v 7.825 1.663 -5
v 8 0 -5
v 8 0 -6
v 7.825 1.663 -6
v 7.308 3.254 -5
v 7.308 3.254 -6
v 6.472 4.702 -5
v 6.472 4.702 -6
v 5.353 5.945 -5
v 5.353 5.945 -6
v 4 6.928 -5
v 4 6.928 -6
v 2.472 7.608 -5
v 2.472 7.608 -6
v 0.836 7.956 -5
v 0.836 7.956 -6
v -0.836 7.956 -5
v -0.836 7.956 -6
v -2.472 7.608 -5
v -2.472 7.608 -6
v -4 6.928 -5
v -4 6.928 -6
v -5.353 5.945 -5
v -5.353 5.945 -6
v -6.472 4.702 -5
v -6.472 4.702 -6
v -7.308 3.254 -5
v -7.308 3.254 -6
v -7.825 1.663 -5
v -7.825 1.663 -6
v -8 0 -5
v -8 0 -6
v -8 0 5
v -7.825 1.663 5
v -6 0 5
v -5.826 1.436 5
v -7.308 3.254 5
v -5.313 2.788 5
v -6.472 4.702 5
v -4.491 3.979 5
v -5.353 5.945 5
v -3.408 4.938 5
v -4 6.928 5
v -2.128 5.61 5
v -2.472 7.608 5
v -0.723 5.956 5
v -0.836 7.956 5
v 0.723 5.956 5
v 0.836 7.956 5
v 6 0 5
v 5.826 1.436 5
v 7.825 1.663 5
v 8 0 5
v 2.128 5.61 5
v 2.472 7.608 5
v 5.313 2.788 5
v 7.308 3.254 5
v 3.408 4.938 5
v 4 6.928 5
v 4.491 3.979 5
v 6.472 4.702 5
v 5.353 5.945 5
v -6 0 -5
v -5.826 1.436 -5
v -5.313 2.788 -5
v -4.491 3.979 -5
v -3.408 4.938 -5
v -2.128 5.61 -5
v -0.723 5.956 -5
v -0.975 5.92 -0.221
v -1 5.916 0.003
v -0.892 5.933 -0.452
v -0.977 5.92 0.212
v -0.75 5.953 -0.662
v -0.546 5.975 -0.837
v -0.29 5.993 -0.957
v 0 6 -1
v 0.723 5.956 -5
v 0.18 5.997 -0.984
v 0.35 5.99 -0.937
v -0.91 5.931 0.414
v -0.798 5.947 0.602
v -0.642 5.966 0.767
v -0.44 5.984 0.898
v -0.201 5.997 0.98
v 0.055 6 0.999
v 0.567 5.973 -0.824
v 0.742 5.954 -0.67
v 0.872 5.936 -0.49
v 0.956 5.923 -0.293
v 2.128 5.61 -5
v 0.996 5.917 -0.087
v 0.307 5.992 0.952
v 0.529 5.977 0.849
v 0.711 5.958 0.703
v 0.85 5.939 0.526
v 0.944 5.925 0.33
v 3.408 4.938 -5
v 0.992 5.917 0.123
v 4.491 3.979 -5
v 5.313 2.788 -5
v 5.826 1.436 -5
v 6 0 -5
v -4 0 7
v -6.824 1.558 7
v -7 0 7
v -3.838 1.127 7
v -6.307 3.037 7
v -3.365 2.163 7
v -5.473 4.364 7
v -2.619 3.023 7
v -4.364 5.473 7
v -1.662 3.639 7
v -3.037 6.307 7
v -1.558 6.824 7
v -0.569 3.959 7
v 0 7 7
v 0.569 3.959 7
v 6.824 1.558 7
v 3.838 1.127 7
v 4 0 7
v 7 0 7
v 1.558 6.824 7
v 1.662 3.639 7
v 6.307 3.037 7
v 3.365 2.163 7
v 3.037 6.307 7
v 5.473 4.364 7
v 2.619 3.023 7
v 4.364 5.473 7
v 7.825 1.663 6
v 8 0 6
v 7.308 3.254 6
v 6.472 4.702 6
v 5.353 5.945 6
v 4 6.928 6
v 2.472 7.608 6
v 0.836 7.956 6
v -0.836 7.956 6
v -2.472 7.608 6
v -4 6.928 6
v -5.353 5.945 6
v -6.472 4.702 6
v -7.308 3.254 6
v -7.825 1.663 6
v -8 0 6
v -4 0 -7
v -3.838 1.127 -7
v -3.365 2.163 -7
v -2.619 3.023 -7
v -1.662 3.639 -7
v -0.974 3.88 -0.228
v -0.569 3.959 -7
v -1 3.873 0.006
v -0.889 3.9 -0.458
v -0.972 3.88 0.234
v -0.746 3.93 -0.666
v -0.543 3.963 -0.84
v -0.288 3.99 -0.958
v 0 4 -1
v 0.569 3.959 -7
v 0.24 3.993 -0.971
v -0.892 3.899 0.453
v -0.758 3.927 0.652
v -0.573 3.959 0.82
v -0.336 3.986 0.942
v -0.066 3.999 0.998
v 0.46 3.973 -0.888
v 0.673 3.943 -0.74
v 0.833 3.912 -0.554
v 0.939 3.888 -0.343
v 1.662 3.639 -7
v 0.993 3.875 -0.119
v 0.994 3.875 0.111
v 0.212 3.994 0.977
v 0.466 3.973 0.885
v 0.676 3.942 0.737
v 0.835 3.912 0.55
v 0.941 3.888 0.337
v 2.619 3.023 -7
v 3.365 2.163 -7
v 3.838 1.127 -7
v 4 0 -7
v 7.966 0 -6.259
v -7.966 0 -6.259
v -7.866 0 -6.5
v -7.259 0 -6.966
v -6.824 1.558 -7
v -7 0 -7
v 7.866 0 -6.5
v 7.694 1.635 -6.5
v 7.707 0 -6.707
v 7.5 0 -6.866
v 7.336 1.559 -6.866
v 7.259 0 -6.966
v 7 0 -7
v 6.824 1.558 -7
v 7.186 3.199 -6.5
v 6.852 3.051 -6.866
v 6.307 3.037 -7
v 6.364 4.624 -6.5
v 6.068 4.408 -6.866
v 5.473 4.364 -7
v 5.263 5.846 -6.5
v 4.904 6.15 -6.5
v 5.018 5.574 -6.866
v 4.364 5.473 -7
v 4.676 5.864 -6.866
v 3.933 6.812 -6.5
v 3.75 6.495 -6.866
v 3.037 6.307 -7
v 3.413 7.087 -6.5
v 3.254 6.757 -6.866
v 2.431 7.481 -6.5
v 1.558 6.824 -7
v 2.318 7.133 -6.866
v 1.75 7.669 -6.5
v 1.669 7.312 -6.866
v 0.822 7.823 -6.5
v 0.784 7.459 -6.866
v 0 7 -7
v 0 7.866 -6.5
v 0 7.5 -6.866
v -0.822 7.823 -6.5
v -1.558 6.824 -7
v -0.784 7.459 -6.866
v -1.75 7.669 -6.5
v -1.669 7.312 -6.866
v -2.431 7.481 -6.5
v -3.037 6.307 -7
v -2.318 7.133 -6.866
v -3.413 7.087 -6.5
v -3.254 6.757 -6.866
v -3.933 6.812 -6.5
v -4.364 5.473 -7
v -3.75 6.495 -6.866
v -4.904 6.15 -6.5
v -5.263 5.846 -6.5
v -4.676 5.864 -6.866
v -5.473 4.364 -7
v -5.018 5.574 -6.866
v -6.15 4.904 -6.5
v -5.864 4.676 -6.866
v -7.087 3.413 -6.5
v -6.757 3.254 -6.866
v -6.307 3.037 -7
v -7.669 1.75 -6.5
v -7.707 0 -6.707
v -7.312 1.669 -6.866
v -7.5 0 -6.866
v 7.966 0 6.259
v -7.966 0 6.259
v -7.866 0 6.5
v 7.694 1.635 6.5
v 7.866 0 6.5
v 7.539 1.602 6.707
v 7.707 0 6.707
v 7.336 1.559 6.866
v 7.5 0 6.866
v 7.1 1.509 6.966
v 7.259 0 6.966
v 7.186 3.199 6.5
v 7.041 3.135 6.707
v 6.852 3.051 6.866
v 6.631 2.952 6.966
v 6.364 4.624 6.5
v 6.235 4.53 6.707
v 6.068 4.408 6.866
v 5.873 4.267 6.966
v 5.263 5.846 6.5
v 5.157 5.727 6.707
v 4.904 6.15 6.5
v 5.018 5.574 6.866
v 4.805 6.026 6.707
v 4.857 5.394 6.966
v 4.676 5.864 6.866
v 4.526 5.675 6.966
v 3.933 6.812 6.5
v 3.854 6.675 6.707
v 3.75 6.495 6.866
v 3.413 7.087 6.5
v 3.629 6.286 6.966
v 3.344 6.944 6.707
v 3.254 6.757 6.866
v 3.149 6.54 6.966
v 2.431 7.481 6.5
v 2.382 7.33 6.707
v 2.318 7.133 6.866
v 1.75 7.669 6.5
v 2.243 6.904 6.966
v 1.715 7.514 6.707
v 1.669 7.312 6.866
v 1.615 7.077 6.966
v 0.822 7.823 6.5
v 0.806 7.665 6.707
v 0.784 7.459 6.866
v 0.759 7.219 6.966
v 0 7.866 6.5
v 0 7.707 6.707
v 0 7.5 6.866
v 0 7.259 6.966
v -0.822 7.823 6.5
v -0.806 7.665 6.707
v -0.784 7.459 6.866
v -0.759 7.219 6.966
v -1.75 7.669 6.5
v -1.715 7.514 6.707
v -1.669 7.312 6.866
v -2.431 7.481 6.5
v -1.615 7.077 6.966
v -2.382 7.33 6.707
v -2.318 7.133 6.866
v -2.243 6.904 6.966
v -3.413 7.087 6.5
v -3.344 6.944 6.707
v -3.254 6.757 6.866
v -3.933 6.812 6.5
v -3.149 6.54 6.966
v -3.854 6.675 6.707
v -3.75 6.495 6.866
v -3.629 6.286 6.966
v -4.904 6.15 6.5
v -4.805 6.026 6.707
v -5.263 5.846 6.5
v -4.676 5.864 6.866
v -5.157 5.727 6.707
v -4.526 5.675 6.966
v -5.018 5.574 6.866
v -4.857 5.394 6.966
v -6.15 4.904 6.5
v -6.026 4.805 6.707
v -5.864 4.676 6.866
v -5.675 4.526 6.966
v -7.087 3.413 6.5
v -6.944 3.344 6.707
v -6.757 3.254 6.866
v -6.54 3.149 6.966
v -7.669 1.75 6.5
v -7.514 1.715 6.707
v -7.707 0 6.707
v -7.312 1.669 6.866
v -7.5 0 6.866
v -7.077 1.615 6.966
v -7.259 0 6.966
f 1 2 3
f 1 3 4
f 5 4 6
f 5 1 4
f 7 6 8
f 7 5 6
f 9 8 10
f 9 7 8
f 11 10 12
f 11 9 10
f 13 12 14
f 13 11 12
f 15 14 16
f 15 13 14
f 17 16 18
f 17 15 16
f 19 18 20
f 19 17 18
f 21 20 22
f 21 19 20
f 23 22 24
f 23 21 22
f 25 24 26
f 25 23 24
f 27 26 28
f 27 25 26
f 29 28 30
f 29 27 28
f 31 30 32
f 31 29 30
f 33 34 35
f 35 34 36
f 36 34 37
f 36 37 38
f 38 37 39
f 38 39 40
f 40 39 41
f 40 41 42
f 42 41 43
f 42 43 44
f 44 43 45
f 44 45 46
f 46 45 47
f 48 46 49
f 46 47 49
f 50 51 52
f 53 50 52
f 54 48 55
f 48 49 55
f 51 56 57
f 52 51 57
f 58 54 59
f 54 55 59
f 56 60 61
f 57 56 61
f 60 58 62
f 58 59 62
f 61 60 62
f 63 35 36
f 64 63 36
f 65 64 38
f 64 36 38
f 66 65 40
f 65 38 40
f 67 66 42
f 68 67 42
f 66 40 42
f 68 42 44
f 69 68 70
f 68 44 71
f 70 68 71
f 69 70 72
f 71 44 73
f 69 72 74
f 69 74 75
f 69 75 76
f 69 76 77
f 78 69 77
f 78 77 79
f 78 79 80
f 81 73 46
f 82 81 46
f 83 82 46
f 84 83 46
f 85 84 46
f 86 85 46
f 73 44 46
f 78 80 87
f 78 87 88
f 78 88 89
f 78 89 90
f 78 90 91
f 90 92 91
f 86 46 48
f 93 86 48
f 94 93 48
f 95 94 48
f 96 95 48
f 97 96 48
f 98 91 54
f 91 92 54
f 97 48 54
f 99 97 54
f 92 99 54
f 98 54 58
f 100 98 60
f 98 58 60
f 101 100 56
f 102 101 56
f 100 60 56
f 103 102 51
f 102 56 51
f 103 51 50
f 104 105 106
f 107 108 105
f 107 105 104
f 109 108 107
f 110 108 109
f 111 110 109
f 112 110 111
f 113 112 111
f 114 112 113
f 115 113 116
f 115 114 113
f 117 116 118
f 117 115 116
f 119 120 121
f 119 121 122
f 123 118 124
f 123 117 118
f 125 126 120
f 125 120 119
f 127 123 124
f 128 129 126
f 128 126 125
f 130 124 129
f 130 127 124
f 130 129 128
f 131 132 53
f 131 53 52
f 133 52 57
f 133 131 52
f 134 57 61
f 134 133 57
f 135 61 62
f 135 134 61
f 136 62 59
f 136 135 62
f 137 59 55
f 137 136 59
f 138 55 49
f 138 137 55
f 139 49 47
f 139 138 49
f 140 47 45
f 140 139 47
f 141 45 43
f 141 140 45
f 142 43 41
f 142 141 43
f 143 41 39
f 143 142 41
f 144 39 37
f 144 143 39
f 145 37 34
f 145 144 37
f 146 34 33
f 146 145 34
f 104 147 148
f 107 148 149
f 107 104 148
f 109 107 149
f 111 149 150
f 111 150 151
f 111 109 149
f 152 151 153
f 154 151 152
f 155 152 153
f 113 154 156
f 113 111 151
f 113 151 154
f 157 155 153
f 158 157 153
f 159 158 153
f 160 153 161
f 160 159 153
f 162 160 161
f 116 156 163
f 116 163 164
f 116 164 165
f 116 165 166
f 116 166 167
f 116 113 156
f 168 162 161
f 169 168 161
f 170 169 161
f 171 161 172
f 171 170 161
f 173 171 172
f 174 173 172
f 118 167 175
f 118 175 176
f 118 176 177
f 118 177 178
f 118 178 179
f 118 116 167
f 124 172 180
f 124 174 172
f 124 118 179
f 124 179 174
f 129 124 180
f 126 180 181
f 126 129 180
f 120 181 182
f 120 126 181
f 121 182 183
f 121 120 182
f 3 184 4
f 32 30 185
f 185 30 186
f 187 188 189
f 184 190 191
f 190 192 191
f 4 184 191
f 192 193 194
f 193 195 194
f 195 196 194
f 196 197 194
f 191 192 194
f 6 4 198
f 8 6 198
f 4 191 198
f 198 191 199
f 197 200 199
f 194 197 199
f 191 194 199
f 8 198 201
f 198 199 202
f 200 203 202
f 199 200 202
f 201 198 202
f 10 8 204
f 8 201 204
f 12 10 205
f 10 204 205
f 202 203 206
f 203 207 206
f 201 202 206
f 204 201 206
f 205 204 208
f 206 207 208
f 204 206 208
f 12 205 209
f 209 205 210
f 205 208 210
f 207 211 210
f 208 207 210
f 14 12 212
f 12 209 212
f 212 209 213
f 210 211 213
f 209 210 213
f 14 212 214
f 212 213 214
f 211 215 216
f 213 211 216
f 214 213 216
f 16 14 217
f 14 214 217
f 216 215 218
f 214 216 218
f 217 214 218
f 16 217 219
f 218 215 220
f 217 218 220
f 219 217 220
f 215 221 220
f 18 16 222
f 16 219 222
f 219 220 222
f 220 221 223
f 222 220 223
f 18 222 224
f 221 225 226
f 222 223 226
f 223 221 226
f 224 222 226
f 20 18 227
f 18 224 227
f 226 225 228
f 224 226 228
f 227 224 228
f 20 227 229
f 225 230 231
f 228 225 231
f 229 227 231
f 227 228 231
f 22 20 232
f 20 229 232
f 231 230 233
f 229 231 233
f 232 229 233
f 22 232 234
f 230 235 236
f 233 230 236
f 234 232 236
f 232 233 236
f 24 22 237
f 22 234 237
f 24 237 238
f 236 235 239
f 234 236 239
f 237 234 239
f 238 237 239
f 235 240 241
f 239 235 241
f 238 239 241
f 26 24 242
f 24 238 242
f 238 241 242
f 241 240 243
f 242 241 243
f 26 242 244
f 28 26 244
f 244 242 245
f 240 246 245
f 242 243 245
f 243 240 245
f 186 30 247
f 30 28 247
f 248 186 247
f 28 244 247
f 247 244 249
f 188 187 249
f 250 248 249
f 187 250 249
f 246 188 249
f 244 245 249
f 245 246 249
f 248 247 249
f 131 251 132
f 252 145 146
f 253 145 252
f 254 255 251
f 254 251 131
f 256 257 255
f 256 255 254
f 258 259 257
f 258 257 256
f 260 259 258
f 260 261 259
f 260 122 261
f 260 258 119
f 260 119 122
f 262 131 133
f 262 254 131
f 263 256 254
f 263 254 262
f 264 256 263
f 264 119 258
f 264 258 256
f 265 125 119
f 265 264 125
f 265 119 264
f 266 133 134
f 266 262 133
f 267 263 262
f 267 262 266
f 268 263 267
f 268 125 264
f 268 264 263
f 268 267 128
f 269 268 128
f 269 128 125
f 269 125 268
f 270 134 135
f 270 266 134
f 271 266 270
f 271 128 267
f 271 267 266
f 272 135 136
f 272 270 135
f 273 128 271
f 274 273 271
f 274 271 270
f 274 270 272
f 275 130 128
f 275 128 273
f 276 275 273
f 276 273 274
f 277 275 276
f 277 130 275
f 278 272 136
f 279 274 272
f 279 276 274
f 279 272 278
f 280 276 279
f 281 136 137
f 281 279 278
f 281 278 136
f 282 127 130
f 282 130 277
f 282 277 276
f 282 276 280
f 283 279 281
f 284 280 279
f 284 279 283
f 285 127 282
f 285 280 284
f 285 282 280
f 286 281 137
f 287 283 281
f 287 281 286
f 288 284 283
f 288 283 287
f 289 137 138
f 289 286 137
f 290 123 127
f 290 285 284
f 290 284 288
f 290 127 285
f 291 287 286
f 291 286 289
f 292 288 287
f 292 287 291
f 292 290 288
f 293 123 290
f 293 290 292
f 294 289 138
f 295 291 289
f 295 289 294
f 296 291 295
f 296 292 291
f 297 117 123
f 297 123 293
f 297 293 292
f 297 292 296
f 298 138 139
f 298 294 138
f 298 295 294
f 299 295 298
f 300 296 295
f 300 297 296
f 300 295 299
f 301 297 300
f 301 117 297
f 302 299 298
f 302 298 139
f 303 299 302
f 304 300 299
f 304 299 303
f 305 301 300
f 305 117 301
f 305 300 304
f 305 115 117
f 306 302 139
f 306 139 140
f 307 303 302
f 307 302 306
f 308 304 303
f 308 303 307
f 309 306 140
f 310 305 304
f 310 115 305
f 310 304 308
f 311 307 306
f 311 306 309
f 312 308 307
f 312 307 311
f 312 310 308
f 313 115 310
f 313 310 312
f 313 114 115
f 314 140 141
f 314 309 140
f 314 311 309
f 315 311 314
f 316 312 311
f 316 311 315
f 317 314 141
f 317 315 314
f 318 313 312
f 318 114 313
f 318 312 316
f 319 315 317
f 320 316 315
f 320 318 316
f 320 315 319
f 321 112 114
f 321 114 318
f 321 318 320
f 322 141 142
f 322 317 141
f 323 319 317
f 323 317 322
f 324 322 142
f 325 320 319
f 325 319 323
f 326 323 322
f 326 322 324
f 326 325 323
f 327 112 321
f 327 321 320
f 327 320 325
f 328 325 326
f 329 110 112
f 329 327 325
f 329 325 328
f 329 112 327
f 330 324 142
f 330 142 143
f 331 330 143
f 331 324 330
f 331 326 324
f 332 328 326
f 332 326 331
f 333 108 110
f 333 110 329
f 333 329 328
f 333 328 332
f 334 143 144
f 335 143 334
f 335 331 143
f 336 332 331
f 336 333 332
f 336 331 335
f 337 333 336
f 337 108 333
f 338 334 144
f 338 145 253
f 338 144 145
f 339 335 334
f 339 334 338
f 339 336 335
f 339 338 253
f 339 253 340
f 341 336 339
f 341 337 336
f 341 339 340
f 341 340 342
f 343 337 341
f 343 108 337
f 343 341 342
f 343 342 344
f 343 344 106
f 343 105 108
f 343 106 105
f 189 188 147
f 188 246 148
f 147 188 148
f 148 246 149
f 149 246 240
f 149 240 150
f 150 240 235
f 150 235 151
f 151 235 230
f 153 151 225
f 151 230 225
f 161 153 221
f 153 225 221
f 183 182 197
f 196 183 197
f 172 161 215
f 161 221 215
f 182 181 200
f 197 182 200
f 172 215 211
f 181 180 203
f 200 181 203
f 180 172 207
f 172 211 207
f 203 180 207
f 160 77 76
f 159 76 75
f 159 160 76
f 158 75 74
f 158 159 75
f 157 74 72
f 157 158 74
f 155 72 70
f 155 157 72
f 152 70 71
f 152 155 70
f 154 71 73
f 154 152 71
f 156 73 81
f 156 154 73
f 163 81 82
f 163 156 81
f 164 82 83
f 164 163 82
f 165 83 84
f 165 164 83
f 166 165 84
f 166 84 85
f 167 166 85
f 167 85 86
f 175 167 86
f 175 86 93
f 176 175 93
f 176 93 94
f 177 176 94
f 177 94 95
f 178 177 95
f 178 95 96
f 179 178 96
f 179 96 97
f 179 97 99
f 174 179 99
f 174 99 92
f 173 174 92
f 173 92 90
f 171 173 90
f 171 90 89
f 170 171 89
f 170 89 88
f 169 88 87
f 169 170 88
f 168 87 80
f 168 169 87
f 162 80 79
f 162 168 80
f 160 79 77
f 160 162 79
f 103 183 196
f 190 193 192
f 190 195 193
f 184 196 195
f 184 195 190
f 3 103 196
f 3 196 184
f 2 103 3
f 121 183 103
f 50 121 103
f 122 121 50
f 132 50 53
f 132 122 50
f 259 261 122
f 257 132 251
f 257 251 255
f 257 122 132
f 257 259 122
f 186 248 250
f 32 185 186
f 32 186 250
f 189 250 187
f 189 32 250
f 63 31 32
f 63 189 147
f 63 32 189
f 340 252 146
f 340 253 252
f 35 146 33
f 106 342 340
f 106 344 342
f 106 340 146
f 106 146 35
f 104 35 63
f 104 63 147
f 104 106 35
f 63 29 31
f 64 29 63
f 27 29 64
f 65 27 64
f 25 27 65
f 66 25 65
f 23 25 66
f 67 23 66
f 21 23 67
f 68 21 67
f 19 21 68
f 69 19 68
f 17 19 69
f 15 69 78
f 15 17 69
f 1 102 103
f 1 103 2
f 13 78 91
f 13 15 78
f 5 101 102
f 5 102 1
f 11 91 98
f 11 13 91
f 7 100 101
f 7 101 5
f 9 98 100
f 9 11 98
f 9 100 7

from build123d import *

# Parameters (mm, degrees)
BOSS_EXTRUDE1_DEPTH = 7
CUT_EXTRUDE1_DEPTH  = 5
FILLET1_R           = 1
SKETCH3_R           = 1
CUT_EXTRUDE2_DEPTH  = 14.304134756


with BuildPart() as part:
    # Sketch1 → Boss-Extrude1 (new, symmetric)
    with BuildSketch(Plane.XY):
        with BuildLine():
            Line((-8, 0), (-4, 0))
            ThreePointArc((-4, 0), (0, 4), (4, 0))
            Line((4, 0), (8, 0))
            ThreePointArc((8, 0), (0, 8), (-8, 0))
        make_face()
    extrude(amount=BOSS_EXTRUDE1_DEPTH, both=True)

    # Sketch2 → Cut-Extrude1 (cut, symmetric)
    with BuildSketch(Plane.XY):
        with BuildLine():
            Line((-8, 0), (-6, 0))
            ThreePointArc((-6, 0), (0, 6), (6, 0))
            Line((6, 0), (8, 0))
            ThreePointArc((8, 0), (0, 8), (-8, 0))
        make_face()
    extrude(amount=CUT_EXTRUDE1_DEPTH, both=True, mode=Mode.SUBTRACT)

    # Fillet1
    fillet1_edges = [part.edges().sort_by_distance(p)[0] for p in [
        (0, 8, 7),
        (0, 8, -7),
    ]]
    fillet(fillet1_edges, radius=FILLET1_R)

    # Sketch3 → Cut-Extrude2 (cut, through all)
    with BuildSketch(Plane(origin=(0, 0, 0), x_dir=(1, 0, 0), z_dir=(0, 1, 0))):
        with Locations(Location((0, 0, 0), (0, 0, 90))):
            Circle(SKETCH3_R)
    extrude(amount=CUT_EXTRUDE2_DEPTH, mode=Mode.SUBTRACT)


solid = part.part
